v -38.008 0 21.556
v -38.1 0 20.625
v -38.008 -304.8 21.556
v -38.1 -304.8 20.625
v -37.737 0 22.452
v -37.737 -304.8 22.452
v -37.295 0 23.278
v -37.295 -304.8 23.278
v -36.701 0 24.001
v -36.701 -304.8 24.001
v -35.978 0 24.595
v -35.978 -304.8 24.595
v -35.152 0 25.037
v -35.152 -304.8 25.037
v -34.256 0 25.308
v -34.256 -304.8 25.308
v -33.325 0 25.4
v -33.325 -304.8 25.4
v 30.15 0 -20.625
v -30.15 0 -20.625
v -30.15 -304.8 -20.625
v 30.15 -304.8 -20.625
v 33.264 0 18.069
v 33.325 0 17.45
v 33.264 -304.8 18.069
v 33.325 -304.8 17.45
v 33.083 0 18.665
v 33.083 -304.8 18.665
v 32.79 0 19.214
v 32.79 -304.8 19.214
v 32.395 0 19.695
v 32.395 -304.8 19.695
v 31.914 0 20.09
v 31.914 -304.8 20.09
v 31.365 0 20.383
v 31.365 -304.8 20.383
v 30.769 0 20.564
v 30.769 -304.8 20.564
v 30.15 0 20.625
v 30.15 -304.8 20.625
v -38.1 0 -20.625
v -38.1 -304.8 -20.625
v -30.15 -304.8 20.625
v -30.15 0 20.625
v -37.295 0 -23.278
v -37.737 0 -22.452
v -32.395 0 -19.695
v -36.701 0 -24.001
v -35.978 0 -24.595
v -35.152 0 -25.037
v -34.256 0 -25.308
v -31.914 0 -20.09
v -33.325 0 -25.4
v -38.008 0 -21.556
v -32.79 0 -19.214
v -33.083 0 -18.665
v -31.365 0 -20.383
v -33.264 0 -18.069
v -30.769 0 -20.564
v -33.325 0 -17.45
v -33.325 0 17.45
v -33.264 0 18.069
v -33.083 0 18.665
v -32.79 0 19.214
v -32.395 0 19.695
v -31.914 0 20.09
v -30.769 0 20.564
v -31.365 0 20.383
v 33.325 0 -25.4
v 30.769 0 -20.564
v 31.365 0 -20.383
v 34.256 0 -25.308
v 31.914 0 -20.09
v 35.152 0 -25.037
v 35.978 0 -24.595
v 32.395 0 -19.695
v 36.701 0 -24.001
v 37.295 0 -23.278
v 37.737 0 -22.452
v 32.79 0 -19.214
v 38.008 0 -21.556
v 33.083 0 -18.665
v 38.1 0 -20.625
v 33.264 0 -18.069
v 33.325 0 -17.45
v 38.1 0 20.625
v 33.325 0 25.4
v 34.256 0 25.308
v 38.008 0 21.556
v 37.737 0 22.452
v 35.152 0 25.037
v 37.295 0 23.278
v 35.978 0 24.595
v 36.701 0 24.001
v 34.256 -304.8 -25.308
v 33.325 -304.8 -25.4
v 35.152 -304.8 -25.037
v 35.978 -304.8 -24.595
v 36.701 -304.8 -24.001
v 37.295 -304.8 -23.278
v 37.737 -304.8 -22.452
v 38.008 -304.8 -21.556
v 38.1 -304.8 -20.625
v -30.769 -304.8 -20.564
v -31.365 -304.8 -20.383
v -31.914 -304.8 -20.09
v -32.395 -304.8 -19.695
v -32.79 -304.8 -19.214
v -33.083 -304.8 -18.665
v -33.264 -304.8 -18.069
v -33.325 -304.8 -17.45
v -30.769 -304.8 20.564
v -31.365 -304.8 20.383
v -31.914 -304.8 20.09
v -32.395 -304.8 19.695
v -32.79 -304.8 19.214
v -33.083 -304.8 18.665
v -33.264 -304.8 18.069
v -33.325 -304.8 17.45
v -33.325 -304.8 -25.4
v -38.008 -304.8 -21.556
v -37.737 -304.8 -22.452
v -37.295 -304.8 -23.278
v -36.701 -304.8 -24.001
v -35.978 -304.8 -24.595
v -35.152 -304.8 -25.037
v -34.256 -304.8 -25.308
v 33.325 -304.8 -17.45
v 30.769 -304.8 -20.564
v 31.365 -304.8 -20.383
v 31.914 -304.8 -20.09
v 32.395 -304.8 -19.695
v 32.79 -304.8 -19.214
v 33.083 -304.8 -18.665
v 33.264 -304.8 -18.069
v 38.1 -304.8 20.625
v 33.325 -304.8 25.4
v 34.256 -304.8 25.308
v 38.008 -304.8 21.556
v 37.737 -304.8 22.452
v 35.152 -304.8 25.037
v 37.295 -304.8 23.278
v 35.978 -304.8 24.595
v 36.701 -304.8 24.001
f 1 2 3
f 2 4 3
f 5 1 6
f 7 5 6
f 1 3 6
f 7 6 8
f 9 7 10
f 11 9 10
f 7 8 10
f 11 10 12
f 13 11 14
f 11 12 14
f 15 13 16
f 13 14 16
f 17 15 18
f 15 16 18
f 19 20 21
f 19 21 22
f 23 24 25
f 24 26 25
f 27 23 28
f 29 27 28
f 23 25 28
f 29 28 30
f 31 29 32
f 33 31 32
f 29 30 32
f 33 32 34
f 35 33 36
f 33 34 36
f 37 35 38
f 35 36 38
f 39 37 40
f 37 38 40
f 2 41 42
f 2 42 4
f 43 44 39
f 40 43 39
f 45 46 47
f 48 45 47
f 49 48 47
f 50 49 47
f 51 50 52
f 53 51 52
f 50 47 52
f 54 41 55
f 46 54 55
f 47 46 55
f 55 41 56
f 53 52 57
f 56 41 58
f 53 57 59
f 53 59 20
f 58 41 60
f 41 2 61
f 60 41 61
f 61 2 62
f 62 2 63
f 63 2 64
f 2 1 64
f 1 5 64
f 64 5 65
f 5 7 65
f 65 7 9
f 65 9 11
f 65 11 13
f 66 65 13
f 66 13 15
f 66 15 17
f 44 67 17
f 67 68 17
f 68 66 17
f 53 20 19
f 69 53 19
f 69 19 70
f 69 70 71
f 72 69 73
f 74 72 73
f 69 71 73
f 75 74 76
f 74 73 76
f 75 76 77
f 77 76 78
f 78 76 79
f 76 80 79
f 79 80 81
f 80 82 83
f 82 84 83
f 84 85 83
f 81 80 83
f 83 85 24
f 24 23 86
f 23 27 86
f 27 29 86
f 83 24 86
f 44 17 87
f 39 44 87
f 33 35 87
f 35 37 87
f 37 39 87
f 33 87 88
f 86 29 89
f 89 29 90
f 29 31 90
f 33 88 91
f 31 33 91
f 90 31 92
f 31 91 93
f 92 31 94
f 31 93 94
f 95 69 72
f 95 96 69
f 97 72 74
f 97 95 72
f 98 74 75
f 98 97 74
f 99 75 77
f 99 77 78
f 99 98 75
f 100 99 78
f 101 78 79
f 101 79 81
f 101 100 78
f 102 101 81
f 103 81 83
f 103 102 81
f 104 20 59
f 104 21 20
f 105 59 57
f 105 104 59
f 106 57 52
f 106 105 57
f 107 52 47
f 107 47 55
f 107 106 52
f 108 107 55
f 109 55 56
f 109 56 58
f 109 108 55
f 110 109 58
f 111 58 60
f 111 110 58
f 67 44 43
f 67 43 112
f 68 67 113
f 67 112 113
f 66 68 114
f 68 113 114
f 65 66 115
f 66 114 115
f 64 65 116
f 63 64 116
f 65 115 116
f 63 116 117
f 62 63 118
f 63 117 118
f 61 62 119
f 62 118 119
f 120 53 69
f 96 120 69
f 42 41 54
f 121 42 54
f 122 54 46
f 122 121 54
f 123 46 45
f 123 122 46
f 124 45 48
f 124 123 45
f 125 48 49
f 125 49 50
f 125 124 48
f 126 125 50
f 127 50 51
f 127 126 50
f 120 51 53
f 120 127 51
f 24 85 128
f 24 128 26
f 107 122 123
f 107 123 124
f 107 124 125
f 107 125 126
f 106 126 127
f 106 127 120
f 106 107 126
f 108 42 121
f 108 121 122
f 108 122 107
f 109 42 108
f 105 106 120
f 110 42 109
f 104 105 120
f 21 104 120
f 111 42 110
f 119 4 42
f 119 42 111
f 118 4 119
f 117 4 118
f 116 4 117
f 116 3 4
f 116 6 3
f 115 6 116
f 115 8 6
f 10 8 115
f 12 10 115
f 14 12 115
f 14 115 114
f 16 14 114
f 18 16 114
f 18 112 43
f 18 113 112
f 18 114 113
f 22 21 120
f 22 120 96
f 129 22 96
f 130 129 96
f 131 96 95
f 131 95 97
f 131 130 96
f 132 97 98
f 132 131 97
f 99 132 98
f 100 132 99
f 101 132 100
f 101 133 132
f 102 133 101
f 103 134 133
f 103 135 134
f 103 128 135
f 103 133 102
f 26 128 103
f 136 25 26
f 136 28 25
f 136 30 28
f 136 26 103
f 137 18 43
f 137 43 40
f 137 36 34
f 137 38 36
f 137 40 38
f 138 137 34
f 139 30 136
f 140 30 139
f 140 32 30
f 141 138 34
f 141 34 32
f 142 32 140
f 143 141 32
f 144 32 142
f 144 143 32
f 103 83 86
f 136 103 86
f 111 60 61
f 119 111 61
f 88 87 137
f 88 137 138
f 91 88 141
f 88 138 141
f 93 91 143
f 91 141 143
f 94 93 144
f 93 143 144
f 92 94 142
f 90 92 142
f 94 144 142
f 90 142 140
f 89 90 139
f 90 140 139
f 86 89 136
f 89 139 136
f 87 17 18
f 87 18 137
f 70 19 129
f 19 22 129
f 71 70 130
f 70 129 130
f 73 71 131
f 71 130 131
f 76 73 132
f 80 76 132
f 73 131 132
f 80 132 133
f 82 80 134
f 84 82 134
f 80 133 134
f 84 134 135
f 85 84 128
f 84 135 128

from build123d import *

# Parameters (mm, degrees)
F0_W     = 76.2
F0_H     = 50.8
F0_W_2   = 66.6496
F0_H_2   = 41.2496
F1_DEPTH = 304.8
F2_R     = 4.7752
F3_R     = 3.175


with BuildPart() as f1:
    # F0 (on Front) → F1 (new body)
    with BuildSketch(Plane.XZ):
        Rectangle(F0_W, F0_H)
        Rectangle(F0_W_2, F0_H_2, mode=Mode.SUBTRACT)
    extrude(amount=F1_DEPTH)

    # F2
    f2_edges = [f1.edges().sort_by_distance(p)[0] for p in [
        (38.1, -152.4, -25.4),
        (-38.1, -152.4, -25.4),
        (-38.1, -152.4, 25.4),
        (38.1, -152.4, 25.4),
    ]]
    fillet(f2_edges, radius=F2_R)

    # F3
    f3_edges = [f1.edges().sort_by_distance(p)[0] for p in [
        (-33.3248, -152.4, 20.6248),
        (33.3248, -152.4, 20.6248),
        (-33.3248, -152.4, -20.6248),
        (33.3248, -152.4, -20.6248),
    ]]
    fillet(f3_edges, radius=F3_R)


solid = f1.part
